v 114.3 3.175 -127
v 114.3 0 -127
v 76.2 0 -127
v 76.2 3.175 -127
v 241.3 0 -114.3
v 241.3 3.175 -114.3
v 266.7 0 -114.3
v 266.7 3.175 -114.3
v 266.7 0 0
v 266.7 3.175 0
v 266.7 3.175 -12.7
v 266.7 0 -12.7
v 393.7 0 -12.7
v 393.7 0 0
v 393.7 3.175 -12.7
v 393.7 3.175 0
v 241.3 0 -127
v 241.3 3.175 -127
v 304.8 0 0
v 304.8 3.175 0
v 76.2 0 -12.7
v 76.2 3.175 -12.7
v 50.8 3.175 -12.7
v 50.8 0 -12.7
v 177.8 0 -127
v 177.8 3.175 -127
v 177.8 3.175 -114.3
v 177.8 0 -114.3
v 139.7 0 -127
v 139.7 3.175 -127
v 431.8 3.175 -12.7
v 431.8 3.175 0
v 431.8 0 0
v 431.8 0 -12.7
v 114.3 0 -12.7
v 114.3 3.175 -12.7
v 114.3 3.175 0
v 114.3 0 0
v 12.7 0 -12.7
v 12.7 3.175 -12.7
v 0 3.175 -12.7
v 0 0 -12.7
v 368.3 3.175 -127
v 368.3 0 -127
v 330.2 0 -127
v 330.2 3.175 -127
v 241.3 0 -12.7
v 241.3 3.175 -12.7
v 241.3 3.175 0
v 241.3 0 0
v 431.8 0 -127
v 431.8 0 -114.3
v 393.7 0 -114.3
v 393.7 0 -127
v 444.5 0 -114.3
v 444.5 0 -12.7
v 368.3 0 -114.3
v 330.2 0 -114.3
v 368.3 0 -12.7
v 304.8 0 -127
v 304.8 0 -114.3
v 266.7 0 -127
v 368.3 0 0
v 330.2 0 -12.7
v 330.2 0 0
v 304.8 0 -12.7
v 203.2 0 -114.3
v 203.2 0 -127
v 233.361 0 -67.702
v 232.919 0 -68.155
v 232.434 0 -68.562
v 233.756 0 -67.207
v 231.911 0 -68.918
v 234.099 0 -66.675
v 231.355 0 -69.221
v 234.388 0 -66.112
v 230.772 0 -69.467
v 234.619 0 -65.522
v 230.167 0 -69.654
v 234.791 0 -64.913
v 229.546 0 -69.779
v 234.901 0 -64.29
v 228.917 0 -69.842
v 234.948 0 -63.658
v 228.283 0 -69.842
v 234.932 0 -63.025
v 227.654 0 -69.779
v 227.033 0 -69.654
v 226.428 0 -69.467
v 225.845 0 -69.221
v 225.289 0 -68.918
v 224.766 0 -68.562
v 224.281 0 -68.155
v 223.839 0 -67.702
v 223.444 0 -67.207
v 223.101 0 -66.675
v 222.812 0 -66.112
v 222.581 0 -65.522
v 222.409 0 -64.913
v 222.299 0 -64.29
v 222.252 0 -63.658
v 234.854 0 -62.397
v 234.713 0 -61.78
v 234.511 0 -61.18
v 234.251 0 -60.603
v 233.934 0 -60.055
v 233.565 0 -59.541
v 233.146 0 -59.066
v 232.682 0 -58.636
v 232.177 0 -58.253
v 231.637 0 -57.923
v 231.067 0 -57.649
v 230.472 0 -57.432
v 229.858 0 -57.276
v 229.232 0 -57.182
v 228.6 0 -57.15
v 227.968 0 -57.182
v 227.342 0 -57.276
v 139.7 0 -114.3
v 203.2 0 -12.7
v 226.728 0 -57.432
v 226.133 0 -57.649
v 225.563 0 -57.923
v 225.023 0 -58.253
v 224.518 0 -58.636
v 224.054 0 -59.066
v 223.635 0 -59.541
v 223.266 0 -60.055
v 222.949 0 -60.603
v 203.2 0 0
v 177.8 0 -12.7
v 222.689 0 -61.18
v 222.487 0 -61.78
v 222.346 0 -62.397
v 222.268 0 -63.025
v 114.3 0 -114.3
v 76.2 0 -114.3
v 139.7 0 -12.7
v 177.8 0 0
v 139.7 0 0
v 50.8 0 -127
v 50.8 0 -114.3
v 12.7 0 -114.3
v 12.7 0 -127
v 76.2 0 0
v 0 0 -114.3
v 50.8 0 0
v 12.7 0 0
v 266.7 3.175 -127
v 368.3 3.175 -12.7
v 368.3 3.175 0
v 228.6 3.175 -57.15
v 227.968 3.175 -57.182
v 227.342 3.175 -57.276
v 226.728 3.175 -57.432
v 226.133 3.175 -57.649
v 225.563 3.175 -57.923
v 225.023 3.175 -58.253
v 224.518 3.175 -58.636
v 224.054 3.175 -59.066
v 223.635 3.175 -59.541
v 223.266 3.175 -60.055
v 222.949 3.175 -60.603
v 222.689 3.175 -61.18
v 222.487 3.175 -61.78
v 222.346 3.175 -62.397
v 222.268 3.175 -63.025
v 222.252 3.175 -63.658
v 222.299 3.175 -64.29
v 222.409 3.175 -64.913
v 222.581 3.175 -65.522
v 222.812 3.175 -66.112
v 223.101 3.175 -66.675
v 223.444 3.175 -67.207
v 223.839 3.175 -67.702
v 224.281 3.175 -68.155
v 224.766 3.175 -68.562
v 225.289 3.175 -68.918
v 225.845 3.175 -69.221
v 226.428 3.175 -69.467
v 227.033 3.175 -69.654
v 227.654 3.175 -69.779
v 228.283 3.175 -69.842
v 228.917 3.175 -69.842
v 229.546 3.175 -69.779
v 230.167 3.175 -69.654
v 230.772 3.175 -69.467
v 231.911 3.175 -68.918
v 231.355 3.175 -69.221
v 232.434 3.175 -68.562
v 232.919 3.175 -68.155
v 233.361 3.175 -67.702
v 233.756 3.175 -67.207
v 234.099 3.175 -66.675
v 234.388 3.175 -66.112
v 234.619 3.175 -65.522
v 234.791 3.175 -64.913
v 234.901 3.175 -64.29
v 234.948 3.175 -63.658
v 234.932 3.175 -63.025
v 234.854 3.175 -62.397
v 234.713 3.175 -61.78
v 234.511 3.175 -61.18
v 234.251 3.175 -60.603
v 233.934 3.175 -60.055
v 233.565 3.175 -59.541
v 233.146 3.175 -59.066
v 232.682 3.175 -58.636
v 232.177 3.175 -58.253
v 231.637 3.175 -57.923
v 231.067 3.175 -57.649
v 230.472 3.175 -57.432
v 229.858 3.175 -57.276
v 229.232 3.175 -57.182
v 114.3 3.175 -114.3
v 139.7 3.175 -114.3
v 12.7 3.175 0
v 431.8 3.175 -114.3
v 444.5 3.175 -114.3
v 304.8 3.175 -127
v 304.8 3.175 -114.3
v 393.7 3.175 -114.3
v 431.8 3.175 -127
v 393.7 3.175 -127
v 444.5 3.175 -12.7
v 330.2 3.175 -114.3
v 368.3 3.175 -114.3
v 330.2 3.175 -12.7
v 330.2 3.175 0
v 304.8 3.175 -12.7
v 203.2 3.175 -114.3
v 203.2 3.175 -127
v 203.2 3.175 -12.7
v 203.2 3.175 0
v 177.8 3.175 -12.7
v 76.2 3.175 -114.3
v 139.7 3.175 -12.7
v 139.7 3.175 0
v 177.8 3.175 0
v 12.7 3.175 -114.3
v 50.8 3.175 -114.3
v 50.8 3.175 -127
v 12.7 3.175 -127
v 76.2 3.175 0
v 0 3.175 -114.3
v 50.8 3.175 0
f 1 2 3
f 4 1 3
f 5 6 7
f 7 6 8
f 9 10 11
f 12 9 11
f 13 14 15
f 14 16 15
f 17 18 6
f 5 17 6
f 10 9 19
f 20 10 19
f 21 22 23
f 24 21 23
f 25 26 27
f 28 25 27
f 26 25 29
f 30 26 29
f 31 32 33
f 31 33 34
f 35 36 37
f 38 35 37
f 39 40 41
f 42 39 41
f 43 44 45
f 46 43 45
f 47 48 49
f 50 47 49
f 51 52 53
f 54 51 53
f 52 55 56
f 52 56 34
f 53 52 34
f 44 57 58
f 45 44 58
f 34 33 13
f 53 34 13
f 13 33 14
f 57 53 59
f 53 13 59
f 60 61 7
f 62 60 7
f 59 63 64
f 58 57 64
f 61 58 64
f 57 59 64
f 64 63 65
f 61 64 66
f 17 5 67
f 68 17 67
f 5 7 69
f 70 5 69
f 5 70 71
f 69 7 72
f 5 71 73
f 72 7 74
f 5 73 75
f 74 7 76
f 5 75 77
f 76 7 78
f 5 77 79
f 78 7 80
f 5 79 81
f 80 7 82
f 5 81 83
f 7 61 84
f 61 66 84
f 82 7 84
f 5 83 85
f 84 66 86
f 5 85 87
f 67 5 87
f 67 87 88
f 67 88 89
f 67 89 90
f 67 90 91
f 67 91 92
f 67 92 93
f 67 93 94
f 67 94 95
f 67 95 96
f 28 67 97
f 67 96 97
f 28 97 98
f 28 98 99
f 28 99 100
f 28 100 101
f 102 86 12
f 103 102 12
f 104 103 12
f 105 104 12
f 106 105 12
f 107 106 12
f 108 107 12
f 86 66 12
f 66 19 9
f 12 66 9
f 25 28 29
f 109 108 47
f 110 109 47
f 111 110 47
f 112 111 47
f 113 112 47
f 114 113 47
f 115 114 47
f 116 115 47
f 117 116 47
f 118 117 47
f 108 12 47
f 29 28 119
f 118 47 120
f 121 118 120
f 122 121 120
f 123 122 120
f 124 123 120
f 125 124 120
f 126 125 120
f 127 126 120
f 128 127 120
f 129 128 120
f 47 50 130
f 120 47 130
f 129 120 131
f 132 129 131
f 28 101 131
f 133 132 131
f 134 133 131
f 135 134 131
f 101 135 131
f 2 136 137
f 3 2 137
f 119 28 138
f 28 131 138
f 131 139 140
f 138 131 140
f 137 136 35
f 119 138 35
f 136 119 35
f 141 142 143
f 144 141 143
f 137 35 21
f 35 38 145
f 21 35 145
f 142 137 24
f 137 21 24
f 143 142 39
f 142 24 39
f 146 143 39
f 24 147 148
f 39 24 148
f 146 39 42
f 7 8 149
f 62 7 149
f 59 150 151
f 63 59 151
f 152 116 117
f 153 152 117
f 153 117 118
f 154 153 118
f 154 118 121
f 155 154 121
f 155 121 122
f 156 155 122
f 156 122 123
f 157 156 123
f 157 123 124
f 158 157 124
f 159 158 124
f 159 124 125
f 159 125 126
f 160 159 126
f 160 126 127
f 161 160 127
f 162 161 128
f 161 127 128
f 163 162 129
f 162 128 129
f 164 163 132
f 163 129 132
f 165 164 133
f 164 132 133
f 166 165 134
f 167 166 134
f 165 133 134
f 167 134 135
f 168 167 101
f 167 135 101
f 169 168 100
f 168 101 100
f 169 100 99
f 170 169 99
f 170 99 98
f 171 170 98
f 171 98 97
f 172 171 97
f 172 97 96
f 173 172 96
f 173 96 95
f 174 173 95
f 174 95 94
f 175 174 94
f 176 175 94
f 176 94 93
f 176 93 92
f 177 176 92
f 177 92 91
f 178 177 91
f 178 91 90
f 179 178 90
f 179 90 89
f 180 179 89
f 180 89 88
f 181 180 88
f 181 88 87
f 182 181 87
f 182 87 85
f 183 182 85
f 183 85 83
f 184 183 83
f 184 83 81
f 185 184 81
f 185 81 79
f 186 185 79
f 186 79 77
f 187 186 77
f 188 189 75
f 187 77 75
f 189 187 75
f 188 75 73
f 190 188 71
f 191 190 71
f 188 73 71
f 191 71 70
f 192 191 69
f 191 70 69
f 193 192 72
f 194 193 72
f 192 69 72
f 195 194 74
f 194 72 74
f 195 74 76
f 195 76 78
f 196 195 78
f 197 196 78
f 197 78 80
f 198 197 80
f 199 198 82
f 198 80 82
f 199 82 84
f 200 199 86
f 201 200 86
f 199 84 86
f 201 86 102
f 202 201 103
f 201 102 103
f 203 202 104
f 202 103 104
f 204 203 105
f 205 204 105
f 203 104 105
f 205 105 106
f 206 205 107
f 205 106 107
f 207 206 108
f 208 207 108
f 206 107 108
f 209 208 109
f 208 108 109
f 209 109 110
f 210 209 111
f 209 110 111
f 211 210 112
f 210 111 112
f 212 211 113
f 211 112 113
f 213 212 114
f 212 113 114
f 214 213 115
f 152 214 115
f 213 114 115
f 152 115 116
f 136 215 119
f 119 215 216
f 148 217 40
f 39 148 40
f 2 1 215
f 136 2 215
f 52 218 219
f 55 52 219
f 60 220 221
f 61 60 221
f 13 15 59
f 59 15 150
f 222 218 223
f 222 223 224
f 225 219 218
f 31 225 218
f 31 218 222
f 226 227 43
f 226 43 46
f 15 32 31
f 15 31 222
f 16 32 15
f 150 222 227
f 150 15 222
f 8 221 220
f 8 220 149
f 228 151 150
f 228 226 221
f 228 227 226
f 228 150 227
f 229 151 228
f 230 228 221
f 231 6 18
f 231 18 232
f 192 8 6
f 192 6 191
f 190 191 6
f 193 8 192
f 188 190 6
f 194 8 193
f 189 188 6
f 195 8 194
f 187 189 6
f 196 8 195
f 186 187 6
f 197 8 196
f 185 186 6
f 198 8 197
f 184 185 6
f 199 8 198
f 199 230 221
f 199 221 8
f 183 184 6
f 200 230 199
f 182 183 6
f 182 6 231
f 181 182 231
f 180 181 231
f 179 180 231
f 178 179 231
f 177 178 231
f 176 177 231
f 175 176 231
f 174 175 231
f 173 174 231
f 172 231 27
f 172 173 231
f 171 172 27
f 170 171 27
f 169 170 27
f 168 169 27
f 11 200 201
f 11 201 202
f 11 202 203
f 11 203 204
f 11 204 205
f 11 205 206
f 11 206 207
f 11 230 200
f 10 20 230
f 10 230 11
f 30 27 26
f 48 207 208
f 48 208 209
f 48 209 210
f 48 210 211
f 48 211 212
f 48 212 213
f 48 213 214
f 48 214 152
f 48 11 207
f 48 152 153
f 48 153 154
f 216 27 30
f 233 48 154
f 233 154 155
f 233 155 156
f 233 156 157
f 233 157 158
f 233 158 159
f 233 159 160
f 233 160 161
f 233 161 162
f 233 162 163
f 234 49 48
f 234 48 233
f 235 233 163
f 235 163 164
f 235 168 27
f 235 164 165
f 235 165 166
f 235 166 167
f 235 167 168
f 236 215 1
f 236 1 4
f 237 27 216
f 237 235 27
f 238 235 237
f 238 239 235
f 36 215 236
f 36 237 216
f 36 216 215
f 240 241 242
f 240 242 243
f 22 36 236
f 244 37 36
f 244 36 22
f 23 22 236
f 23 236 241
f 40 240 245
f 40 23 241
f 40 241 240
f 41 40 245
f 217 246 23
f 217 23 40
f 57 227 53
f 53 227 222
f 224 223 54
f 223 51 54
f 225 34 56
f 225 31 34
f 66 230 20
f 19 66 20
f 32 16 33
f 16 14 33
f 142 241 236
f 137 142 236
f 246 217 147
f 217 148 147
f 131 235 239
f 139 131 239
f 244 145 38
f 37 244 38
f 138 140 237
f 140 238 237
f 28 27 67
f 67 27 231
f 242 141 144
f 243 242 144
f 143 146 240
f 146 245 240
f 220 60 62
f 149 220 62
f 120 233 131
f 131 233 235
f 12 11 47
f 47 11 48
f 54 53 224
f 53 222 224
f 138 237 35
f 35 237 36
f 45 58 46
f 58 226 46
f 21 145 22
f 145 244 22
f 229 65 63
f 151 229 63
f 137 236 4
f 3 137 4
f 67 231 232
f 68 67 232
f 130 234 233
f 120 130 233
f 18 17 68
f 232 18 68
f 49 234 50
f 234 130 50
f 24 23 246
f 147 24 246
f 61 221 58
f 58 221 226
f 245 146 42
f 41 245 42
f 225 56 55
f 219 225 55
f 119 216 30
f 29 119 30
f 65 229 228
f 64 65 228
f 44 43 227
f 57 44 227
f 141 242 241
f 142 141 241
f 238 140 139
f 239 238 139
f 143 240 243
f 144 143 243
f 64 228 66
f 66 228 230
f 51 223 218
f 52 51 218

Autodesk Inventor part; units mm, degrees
ref_plane "YZ Plane" through (0, 0, 0) normal (1, 0, 0) x (0, 1, 0)
ref_plane "XZ Plane" through (0, 0, 0) normal (0, 1, 0) x (-1, 0, 0)
ref_plane "XY Plane" through (0, 0, 0) normal (0, 0, 1) x (1, 0, 0)
sketch "Sketch1" plane through (0, 0, 0) normal (0, 1, 0) x (-1, 0, 0)
  line L0 (0, 0) -> (-444.5, 0)
  line L1 (-444.5, 0) -> (-444.5, -127)
  line L2 (-444.5, -127) -> (0, -127)
  line L3 (0, -127) -> (0, 0)
  dimension "d0" = 444.5
  dimension "d1" = 127
extrude "Extrusion1" add sketch "Sketch1" along normal blind 3.175
sketch "Sketch2" plane through (0, 3.175, 0) normal (0, 1, 0) x (1, 0, 0)
  line L0 (0, 127) -> (0, 0) projected
  line L1 (0, 114.3) -> (12.7, 114.3)
  line L2 (12.7, 114.3) -> (12.7, 127)
  line L3 (444.5, 127) -> (0, 127) projected
  line L4 (50.8, 127) -> (50.8, 114.3)
  line L5 (50.8, 114.3) -> (76.2, 114.3)
  line L6 (76.2, 114.3) -> (76.2, 127)
  line L7 (114.3, 127) -> (114.3, 114.3)
  line L8 (114.3, 114.3) -> (139.7, 114.3)
  line L9 (139.7, 114.3) -> (139.7, 127)
  line L10 (177.8, 127) -> (177.8, 114.3)
  line L11 (177.8, 114.3) -> (203.2, 114.3)
  line L12 (203.2, 114.3) -> (203.2, 127)
  line L13 (241.3, 127) -> (241.3, 114.3)
  line L14 (241.3, 114.3) -> (266.7, 114.3)
  line L15 (266.7, 114.3) -> (266.7, 127)
  line L16 (304.8, 127) -> (304.8, 114.3)
  line L17 (304.8, 114.3) -> (330.2, 114.3)
  line L18 (330.2, 114.3) -> (330.2, 127)
  line L19 (368.3, 127) -> (368.3, 114.3)
  line L20 (368.3, 114.3) -> (393.7, 114.3)
  line L21 (393.7, 114.3) -> (393.7, 127)
  line L22 (431.8, 127) -> (431.8, 114.3)
  line L23 (431.8, 114.3) -> (444.5, 114.3)
  line L24 (444.5, 0) -> (444.5, 127) projected
  line L25 (0, 114.3) -> (0, 127)
  line L26 (50.8, 127) -> (76.2, 127)
  line L27 (114.3, 127) -> (139.7, 127)
  line L28 (177.8, 127) -> (203.2, 127)
  line L29 (241.3, 127) -> (266.7, 127)
  line L30 (304.8, 127) -> (330.2, 127)
  line L31 (368.3, 127) -> (393.7, 127)
  line L32 (431.8, 127) -> (444.5, 127)
  line L33 (0, 127) -> (12.7, 127)
  point P0 (444.5, 114.3)
  point P1 (12.7, 127)
  dimension "d4" = 12.7
  dimension "d6" = 12.7
  dimension "d7" = 12.7
  dimension "d8" = 12.7
  dimension "d9" = 25.4
  dimension "d10" = 38.1
  dimension "d11" = 25.4
  dimension "d12" = 38.1
  dimension "d13" = 25.4
  dimension "d14" = 38.1
  dimension "d15" = 25.4
  dimension "d16" = 38.1
  dimension "d17" = 25.4
  dimension "d18" = 38.1
  dimension "d19" = 25.4
  dimension "d20" = 38.1
  dimension "d22" = 0
  dimension "d42" = 12.7
  dimension "d53" = 38.1
extrude "Extrusion2" cut sketch "Sketch2" against normal through all
sketch "Sketch3" plane through (0, 3.175, 0) normal (0, 1, 0) x (1, 0, 0)
  line L0 (0, 0) -> (444.5, 0) projected
  line L1 (0, 0) -> (12.7, 0)
  line L2 (12.7, 0) -> (12.7, 12.7)
  line L3 (12.7, 12.7) -> (0, 12.7)
  line L4 (0, 12.7) -> (0, 0)
  line L5 (50.8, 0) -> (76.2, 0)
  line L6 (76.2, 0) -> (76.2, 12.7)
  line L7 (76.2, 12.7) -> (50.8, 12.7)
  line L8 (50.8, 12.7) -> (50.8, 0)
  line L9 (114.3, 0) -> (139.7, 0)
  line L10 (139.7, 0) -> (139.7, 12.7)
  line L11 (139.7, 12.7) -> (114.3, 12.7)
  line L12 (114.3, 12.7) -> (114.3, 0)
  line L13 (177.8, 0) -> (203.2, 0)
  line L14 (203.2, 0) -> (203.2, 12.7)
  line L15 (203.2, 12.7) -> (177.8, 12.7)
  line L16 (177.8, 12.7) -> (177.8, 0)
  line L17 (241.3, 0) -> (266.7, 0)
  line L18 (266.7, 0) -> (266.7, 12.7)
  line L19 (266.7, 12.7) -> (241.3, 12.7)
  line L20 (241.3, 12.7) -> (241.3, 0)
  line L21 (304.8, 0) -> (330.2, 0)
  line L22 (330.2, 0) -> (330.2, 12.7)
  line L23 (330.2, 12.7) -> (304.8, 12.7)
  line L24 (304.8, 12.7) -> (304.8, 0)
  line L25 (368.3, 0) -> (393.7, 0)
  line L26 (393.7, 0) -> (393.7, 12.7)
  line L27 (393.7, 12.7) -> (368.3, 12.7)
  line L28 (368.3, 12.7) -> (368.3, 0)
  line L29 (444.5, 0) -> (444.5, 114.3) projected
  line L30 (444.5, 0) -> (431.8, 0)
  line L31 (431.8, 0) -> (431.8, 12.7)
  line L32 (431.8, 12.7) -> (444.5, 12.7)
  line L33 (444.5, 12.7) -> (444.5, 0)
  point P0 (431.8, 0)
  point P1 (393.7, 0)
  point P2 (330.2, 0)
  point P3 (266.7, 0)
  point P4 (203.2, 0)
  point P5 (139.7, 0)
  point P6 (50.8, 0)
  point P7 (76.2, 0)
  point P8 (12.7, 0)
  dimension "d25" = 12.7
  dimension "d26" = 12.7
  dimension "d27" = 25.4
  dimension "d28" = 38.1
  dimension "d29" = 25.4
  dimension "d30" = 25.4
  dimension "d31" = 25.4
  dimension "d32" = 25.4
  dimension "d33" = 25.4
  dimension "d34" = 12.7
  dimension "d35" = 38.1
  dimension "d36" = 38.1
  dimension "d37" = 38.1
  dimension "d38" = 38.1
  dimension "d39" = 38.1
extrude "Extrusion3" cut sketch "Sketch3" against normal through all
sketch "Sketch4" plane through (0, 3.175, 0) normal (0, 1, 0) x (1, 0, 0)
  circle A0 centre (228.6, 63.5) radius 6.35
  line L0 (0, 114.3) -> (0, 12.7) projected
  line L1 (241.3, 127) -> (203.2, 127) projected
  point P0 (0, 0)
  dimension "d43" = 12.7
  dimension "d44" = 228.6
  dimension "d45" = 63.5
hole "Hole1" at (228.6, 3.175, -63.5) direction (0, -1, 0) diameter 12.7 end through all
properties part number "BridgeBottom"
